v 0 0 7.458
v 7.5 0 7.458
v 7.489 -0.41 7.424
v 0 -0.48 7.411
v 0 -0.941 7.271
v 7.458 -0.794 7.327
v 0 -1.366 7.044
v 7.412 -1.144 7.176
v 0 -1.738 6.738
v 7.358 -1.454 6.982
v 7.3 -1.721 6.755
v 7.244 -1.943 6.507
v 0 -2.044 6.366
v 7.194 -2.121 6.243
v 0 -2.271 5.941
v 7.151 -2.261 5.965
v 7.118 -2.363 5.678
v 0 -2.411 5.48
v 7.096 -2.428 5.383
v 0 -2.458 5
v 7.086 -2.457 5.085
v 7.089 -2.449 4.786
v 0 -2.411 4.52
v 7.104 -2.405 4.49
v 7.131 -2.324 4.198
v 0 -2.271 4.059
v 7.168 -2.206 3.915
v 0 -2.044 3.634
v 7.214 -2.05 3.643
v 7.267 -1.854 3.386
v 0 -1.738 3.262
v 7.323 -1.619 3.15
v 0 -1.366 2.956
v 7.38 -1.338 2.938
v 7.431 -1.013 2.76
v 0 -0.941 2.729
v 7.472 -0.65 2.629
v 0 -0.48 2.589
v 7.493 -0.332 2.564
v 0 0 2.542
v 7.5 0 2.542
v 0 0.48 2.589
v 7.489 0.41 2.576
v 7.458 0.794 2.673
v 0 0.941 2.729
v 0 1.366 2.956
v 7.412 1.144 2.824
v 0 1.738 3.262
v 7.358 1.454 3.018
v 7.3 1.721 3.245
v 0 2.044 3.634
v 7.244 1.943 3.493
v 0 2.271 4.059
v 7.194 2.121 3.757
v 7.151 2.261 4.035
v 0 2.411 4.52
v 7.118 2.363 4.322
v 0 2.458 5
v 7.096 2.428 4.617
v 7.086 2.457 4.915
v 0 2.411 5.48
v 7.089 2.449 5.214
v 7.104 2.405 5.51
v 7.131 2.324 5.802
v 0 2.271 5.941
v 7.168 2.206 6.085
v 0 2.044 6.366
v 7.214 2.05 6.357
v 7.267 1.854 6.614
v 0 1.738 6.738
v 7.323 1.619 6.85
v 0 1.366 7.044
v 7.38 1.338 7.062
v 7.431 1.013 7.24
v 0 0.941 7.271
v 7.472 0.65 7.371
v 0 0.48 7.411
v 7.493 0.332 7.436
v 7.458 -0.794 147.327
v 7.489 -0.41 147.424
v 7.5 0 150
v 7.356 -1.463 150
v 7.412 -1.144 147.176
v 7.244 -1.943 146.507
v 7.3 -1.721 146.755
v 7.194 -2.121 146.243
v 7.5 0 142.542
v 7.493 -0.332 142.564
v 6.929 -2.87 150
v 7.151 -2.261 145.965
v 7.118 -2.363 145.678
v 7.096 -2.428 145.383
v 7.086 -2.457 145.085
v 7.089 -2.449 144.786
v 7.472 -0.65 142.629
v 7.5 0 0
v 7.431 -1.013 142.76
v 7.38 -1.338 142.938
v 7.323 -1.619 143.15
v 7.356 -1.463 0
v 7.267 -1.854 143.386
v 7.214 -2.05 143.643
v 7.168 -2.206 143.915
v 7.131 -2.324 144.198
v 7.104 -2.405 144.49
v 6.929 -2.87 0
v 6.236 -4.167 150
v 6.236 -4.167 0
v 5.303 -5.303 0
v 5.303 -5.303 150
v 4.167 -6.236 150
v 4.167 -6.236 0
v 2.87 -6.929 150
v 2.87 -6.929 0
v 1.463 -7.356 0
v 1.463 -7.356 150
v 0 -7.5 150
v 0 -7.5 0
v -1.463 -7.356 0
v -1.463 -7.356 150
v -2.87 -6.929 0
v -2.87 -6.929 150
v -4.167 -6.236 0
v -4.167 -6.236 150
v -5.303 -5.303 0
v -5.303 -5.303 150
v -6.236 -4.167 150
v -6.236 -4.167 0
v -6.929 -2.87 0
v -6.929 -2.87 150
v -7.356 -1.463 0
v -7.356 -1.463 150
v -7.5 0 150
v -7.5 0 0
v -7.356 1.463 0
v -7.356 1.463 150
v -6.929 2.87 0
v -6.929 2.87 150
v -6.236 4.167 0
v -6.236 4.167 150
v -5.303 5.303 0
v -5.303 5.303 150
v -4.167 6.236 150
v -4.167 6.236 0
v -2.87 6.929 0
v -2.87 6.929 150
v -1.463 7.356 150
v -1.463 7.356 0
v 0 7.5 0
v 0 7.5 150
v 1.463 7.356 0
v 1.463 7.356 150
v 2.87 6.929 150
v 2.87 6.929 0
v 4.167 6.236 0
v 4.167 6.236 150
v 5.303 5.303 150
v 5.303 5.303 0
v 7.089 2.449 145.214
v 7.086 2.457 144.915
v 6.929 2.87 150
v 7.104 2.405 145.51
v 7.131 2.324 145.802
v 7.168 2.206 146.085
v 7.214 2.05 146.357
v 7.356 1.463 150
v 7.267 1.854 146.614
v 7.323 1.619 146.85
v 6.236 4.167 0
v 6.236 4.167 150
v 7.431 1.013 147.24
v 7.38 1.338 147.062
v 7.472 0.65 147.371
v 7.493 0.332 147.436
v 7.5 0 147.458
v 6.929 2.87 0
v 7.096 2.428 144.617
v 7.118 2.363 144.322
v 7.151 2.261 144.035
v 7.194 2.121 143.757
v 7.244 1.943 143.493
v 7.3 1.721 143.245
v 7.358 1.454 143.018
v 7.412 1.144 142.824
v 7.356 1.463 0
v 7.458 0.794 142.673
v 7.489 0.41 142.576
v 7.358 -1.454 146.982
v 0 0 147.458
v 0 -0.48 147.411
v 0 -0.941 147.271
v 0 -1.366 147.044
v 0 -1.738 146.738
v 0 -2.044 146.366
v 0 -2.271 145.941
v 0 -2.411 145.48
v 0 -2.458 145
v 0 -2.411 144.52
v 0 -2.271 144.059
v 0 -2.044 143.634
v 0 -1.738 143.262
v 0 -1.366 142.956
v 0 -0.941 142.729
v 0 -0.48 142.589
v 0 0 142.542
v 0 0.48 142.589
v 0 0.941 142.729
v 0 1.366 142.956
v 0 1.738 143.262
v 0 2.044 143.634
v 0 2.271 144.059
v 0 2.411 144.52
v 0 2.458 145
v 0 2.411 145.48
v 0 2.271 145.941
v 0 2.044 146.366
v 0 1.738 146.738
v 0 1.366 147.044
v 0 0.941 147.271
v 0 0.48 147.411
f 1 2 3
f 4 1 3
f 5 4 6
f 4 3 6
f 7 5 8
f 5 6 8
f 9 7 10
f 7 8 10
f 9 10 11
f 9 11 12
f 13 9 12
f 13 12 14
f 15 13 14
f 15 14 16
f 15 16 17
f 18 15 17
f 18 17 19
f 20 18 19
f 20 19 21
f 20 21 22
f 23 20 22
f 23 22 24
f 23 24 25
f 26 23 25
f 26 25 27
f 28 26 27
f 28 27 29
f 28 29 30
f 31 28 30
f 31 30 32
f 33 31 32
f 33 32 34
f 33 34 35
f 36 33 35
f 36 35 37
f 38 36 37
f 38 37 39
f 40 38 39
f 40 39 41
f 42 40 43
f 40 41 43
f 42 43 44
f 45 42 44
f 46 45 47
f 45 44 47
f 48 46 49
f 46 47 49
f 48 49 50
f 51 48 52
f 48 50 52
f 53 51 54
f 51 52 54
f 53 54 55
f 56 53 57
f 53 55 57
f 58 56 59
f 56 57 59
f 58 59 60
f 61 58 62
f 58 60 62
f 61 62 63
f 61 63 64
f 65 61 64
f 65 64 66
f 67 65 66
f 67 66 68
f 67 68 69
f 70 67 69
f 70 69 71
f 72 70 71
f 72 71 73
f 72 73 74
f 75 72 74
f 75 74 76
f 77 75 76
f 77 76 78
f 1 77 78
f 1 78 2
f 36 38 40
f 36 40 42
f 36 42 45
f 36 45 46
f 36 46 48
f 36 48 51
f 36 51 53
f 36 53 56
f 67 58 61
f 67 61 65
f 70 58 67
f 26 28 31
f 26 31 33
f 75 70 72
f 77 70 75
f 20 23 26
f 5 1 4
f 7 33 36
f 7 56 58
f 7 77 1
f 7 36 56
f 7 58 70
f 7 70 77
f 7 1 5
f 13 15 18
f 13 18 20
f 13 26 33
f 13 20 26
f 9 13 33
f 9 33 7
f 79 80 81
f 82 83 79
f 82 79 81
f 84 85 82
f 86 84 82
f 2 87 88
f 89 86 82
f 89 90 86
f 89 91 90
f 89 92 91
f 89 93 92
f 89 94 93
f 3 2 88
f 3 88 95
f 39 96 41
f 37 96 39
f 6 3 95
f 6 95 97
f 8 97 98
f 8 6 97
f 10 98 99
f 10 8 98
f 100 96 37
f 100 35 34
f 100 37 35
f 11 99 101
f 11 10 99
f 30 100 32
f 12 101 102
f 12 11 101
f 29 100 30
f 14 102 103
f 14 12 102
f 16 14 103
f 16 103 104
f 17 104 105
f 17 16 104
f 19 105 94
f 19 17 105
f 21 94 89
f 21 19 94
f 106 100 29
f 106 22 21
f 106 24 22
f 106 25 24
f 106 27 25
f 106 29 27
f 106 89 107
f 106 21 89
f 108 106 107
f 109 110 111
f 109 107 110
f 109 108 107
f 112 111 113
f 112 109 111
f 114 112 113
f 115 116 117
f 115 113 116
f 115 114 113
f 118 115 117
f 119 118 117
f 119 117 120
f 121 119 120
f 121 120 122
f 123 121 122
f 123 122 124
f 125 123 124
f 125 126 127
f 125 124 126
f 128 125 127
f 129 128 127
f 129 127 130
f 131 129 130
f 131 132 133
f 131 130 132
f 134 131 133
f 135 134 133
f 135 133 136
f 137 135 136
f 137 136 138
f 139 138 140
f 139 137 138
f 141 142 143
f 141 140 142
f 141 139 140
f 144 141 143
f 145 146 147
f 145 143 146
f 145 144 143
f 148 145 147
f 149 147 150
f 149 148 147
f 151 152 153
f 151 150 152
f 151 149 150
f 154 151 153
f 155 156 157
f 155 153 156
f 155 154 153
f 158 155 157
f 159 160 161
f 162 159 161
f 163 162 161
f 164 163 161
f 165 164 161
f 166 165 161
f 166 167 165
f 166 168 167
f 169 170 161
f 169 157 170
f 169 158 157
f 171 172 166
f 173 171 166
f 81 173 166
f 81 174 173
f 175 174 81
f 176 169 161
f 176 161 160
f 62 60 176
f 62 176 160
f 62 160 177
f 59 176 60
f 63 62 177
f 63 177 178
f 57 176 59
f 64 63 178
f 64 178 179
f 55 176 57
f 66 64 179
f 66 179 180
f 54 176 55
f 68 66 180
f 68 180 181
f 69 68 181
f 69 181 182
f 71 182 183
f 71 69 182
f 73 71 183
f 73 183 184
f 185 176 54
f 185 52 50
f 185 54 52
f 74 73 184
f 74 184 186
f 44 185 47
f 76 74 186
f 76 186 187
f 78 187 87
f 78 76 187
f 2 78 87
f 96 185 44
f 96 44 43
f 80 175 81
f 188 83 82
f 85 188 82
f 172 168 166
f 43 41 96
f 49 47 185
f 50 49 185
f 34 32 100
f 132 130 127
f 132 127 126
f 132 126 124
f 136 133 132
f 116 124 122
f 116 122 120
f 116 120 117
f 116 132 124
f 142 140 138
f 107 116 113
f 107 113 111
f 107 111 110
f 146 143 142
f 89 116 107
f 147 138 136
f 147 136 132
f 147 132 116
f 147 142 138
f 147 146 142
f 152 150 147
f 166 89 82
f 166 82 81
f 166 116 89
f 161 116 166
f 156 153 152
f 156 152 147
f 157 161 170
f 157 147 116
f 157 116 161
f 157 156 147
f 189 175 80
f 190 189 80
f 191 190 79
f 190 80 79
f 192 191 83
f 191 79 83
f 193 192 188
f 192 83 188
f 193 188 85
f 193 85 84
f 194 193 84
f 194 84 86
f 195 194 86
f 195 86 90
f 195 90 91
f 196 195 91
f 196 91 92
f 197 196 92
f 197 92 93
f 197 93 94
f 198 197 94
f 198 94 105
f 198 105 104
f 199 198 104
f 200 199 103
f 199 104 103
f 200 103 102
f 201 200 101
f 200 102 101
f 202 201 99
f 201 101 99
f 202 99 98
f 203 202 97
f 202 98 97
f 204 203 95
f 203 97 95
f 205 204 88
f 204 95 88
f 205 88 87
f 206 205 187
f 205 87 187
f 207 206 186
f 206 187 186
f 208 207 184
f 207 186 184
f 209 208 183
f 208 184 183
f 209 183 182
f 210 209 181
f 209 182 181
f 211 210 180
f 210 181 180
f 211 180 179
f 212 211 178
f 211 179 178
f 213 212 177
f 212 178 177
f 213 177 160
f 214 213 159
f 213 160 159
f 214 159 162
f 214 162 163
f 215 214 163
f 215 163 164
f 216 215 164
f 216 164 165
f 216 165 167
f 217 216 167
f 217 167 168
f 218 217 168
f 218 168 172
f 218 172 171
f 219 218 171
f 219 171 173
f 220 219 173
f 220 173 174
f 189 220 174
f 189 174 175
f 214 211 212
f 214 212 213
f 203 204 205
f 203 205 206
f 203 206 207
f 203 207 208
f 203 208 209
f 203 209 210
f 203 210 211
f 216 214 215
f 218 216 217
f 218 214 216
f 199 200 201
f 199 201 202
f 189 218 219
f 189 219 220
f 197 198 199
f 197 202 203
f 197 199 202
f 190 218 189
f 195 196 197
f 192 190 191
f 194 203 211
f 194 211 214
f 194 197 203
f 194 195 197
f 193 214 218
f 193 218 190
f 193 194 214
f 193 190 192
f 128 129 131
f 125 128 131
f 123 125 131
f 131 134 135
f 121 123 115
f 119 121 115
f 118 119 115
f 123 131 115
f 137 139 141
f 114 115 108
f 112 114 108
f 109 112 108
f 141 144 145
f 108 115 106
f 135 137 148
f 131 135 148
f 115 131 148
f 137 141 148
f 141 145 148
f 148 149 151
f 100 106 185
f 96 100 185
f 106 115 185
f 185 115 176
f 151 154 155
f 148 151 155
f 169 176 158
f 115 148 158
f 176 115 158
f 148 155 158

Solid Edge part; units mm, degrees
sketch "Sketch1" plane through (0, 0, 0) normal (0, 0, 1) x (1, 0, 0)
  circle A0 centre (0, 0) radius 7.5
extrude "Protrusion1" add sketch "Sketch1" along normal blind 150
hole "Hole_4" at (0, 0, 145) direction (1, 0, 0) diameter 4.917 depth 7.5
hole "Hole1" at (0, 0, 5) direction (1, 0, 0) diameter 4.917 depth 7.5
